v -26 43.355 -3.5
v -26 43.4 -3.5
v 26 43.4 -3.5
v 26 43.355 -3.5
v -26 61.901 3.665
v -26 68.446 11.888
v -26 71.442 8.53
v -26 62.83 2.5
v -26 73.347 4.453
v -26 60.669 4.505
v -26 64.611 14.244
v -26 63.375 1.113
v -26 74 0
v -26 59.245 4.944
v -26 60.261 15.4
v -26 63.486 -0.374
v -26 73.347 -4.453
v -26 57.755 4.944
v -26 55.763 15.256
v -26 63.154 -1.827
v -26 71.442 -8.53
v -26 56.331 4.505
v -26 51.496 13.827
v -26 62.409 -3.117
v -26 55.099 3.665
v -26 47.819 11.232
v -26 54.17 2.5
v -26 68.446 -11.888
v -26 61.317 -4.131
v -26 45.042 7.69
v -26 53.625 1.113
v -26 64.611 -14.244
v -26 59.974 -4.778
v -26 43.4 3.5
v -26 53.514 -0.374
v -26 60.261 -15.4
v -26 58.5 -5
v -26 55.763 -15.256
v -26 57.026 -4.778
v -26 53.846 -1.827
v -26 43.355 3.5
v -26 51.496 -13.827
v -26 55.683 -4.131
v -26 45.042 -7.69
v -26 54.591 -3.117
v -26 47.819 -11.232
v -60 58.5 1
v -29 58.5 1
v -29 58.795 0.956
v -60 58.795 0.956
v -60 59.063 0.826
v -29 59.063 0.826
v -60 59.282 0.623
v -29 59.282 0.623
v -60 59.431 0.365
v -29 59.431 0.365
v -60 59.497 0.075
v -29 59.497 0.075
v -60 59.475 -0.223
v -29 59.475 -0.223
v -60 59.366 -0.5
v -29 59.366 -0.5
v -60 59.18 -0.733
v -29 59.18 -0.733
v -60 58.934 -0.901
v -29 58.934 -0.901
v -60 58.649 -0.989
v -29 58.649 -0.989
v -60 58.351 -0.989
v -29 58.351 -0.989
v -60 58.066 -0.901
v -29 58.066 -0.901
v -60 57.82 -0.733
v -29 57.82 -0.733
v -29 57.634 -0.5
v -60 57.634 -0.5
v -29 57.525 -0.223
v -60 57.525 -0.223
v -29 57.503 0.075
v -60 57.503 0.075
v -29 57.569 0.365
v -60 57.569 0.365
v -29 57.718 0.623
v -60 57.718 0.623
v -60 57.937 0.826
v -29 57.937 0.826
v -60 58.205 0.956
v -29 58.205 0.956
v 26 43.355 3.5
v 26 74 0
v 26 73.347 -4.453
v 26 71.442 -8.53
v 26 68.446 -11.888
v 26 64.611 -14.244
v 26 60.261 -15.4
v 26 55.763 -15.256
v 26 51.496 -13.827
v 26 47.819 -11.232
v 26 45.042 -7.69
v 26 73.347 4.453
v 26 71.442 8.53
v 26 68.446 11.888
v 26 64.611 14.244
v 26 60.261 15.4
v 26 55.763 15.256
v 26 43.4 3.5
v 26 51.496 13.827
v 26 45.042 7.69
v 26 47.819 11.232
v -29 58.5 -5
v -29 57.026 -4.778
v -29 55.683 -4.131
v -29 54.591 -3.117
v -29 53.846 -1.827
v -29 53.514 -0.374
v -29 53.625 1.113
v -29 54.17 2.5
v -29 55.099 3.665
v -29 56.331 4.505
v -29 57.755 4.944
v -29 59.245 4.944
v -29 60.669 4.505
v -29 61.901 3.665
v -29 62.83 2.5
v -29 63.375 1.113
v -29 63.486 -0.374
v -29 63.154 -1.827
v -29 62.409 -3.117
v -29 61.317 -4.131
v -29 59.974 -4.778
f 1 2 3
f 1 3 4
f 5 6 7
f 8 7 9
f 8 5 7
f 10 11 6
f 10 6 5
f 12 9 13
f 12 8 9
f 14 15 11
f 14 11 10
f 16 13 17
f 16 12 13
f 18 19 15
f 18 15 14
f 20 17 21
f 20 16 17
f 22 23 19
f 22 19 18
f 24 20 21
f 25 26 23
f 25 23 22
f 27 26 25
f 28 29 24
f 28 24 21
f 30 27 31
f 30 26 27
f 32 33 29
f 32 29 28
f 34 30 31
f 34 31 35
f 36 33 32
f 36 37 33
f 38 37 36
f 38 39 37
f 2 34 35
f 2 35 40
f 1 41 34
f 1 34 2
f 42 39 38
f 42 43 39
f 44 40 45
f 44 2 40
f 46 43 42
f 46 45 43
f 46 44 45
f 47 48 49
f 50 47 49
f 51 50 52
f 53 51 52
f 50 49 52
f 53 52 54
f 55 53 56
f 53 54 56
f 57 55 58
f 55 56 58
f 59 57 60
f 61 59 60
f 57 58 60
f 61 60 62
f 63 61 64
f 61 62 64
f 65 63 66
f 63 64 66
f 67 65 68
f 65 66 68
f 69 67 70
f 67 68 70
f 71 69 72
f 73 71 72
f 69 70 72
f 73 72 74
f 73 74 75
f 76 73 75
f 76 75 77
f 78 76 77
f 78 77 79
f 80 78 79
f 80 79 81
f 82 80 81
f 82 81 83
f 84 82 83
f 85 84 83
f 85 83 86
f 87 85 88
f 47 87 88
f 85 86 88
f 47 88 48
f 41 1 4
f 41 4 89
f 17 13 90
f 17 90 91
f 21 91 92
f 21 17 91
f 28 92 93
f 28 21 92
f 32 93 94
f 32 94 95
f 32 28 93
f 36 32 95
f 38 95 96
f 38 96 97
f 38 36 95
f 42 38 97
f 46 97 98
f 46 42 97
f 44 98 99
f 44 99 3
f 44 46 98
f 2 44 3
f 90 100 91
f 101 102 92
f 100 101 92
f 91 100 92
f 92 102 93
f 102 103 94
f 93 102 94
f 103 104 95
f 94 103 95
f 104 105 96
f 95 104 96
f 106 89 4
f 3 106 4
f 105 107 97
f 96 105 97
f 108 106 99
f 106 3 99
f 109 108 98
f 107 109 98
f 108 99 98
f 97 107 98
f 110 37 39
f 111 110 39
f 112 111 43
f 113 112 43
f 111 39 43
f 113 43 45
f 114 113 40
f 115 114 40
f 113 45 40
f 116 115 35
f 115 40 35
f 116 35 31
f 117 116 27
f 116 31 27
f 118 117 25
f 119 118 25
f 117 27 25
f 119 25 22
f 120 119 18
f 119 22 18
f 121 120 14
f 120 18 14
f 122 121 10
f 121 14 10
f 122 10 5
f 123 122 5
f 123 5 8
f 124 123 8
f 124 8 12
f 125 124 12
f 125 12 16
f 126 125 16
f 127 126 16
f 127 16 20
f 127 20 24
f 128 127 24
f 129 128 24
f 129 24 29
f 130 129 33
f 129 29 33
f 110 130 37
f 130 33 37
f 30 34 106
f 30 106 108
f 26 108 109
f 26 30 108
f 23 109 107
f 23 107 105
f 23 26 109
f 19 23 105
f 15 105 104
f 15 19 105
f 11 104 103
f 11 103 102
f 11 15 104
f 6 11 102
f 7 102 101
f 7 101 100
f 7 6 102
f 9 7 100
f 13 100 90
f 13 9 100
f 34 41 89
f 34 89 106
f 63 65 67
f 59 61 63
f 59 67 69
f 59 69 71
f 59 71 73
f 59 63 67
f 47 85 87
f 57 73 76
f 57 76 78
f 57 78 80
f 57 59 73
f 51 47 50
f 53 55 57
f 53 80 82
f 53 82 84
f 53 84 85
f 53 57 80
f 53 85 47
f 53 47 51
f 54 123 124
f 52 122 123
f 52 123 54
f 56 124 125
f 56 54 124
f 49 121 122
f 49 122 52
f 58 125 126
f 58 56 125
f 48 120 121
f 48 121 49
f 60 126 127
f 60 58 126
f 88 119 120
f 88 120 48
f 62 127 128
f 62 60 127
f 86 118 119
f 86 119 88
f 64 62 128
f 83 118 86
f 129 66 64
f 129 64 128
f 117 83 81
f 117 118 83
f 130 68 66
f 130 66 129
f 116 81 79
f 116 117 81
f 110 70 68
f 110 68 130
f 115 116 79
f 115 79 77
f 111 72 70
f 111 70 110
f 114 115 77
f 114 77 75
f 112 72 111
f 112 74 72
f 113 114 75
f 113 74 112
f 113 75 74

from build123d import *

# Parameters (mm, degrees)
SKETCH1_W           = 52
SKETCH1_H           = 40
BOSS_EXTRUDE1_DEPTH = 3
SKETCH2_W           = 35
SKETCH2_H           = 7
BOSS_EXTRUDE2_DEPTH = 40
CUT_EXTRUDE1_DEPTH  = 56.472966389
SKETCH4_W           = 52
SKETCH4_H           = 40
BOSS_EXTRUDE3_DEPTH = 31
CUT_EXTRUDE10_DEPTH = 93.628289415
CUT_EXTRUDE11_DEPTH = 93.628289415
SKETCH8_R           = 5
BOSS_EXTRUDE4_DEPTH = 3
SKETCH9_R           = 1
BOSS_EXTRUDE5_DEPTH = 31
SKETCH10_W          = 43.211860489
SKETCH10_H          = 44.174227803
CUT_EXTRUDE12_DEPTH = 70


with BuildPart() as part:
    # Sketch1 → Boss-Extrude1 (new body)
    with BuildSketch(Plane(origin=(0, 0, 0), x_dir=(1, 0, 0), z_dir=(0, 1, 0))):
        Rectangle(SKETCH1_W, SKETCH1_H)
    extrude(amount=BOSS_EXTRUDE1_DEPTH)

    # Sketch2 → Boss-Extrude2 (add)
    with BuildSketch(Plane(origin=(0, 3, 0), x_dir=(1, 0, 0), z_dir=(0, 1, 0))):
        with Locations((1.5, 0)):
            Rectangle(SKETCH2_W, SKETCH2_H)
    extrude(amount=BOSS_EXTRUDE2_DEPTH)

    # Sketch3 → Cut-Extrude1 (cut, through all)
    with BuildSketch(Plane(origin=(0, 0, -3.5), x_dir=(-1, 0, 0), z_dir=(0, 0, -1))):
        Polygon((1, 43), (16, 3), (16, 43), align=None)
    extrude(amount=-CUT_EXTRUDE1_DEPTH, mode=Mode.SUBTRACT)

    # Sketch4 → Boss-Extrude3 (add)
    with BuildSketch(Plane(origin=(0, 43, 0), x_dir=(1, 0, 0), z_dir=(0, 1, 0))):
        Rectangle(SKETCH4_W, SKETCH4_H)
    extrude(amount=BOSS_EXTRUDE3_DEPTH)

    # Sketch5 → Cut-Extrude10 (cut, through all)
    with BuildSketch(Plane.ZY.offset(26)):
        with BuildLine():
            Line((-20, 43), (-20, 74))
            Line((-20, 74), (0, 74))
            ThreePointArc((0, 74), (-15.399591999, 60.261410302), (-3.5, 43.400331129))
            Line((-3.5, 43.400331129), (-3.5, 43))
            Line((-3.5, 43), (-20, 43))
        make_face()
    extrude(amount=-CUT_EXTRUDE10_DEPTH, mode=Mode.SUBTRACT)

    # Sketch7 → Cut-Extrude11 (cut, through all)
    with BuildSketch(Plane.ZY.offset(26)):
        with BuildLine():
            Line((0, 74), (20, 74))
            Line((20, 74), (20, 43))
            Line((20, 43), (3.5, 43))
            Line((3.5, 43), (3.5, 43.400331129))
            ThreePointArc((3.5, 43.400331129), (15.399591999, 60.261410302), (0, 74))
        make_face()
    extrude(amount=-CUT_EXTRUDE11_DEPTH, mode=Mode.SUBTRACT)

    # Sketch8 → Boss-Extrude4 (add)
    with BuildSketch(Plane.ZY.offset(26)):
        with Locations(Location((0, 58.5, 0), (0, 0, 180))):
            Circle(SKETCH8_R)
    extrude(amount=BOSS_EXTRUDE4_DEPTH)

    # Sketch9 → Boss-Extrude5 (add)
    with BuildSketch(Plane.ZY.offset(29)):
        with Locations((0, 58.5)):
            Circle(SKETCH9_R)
    extrude(amount=BOSS_EXTRUDE5_DEPTH)

    # Sketch10 → Cut-Extrude12 (cut)
    with BuildSketch(Plane.ZY.offset(-30)):
        with Locations((-0.422313508, 21.268278388)):
            Rectangle(SKETCH10_W, SKETCH10_H)
    extrude(amount=CUT_EXTRUDE12_DEPTH, mode=Mode.SUBTRACT)


solid = part.part
